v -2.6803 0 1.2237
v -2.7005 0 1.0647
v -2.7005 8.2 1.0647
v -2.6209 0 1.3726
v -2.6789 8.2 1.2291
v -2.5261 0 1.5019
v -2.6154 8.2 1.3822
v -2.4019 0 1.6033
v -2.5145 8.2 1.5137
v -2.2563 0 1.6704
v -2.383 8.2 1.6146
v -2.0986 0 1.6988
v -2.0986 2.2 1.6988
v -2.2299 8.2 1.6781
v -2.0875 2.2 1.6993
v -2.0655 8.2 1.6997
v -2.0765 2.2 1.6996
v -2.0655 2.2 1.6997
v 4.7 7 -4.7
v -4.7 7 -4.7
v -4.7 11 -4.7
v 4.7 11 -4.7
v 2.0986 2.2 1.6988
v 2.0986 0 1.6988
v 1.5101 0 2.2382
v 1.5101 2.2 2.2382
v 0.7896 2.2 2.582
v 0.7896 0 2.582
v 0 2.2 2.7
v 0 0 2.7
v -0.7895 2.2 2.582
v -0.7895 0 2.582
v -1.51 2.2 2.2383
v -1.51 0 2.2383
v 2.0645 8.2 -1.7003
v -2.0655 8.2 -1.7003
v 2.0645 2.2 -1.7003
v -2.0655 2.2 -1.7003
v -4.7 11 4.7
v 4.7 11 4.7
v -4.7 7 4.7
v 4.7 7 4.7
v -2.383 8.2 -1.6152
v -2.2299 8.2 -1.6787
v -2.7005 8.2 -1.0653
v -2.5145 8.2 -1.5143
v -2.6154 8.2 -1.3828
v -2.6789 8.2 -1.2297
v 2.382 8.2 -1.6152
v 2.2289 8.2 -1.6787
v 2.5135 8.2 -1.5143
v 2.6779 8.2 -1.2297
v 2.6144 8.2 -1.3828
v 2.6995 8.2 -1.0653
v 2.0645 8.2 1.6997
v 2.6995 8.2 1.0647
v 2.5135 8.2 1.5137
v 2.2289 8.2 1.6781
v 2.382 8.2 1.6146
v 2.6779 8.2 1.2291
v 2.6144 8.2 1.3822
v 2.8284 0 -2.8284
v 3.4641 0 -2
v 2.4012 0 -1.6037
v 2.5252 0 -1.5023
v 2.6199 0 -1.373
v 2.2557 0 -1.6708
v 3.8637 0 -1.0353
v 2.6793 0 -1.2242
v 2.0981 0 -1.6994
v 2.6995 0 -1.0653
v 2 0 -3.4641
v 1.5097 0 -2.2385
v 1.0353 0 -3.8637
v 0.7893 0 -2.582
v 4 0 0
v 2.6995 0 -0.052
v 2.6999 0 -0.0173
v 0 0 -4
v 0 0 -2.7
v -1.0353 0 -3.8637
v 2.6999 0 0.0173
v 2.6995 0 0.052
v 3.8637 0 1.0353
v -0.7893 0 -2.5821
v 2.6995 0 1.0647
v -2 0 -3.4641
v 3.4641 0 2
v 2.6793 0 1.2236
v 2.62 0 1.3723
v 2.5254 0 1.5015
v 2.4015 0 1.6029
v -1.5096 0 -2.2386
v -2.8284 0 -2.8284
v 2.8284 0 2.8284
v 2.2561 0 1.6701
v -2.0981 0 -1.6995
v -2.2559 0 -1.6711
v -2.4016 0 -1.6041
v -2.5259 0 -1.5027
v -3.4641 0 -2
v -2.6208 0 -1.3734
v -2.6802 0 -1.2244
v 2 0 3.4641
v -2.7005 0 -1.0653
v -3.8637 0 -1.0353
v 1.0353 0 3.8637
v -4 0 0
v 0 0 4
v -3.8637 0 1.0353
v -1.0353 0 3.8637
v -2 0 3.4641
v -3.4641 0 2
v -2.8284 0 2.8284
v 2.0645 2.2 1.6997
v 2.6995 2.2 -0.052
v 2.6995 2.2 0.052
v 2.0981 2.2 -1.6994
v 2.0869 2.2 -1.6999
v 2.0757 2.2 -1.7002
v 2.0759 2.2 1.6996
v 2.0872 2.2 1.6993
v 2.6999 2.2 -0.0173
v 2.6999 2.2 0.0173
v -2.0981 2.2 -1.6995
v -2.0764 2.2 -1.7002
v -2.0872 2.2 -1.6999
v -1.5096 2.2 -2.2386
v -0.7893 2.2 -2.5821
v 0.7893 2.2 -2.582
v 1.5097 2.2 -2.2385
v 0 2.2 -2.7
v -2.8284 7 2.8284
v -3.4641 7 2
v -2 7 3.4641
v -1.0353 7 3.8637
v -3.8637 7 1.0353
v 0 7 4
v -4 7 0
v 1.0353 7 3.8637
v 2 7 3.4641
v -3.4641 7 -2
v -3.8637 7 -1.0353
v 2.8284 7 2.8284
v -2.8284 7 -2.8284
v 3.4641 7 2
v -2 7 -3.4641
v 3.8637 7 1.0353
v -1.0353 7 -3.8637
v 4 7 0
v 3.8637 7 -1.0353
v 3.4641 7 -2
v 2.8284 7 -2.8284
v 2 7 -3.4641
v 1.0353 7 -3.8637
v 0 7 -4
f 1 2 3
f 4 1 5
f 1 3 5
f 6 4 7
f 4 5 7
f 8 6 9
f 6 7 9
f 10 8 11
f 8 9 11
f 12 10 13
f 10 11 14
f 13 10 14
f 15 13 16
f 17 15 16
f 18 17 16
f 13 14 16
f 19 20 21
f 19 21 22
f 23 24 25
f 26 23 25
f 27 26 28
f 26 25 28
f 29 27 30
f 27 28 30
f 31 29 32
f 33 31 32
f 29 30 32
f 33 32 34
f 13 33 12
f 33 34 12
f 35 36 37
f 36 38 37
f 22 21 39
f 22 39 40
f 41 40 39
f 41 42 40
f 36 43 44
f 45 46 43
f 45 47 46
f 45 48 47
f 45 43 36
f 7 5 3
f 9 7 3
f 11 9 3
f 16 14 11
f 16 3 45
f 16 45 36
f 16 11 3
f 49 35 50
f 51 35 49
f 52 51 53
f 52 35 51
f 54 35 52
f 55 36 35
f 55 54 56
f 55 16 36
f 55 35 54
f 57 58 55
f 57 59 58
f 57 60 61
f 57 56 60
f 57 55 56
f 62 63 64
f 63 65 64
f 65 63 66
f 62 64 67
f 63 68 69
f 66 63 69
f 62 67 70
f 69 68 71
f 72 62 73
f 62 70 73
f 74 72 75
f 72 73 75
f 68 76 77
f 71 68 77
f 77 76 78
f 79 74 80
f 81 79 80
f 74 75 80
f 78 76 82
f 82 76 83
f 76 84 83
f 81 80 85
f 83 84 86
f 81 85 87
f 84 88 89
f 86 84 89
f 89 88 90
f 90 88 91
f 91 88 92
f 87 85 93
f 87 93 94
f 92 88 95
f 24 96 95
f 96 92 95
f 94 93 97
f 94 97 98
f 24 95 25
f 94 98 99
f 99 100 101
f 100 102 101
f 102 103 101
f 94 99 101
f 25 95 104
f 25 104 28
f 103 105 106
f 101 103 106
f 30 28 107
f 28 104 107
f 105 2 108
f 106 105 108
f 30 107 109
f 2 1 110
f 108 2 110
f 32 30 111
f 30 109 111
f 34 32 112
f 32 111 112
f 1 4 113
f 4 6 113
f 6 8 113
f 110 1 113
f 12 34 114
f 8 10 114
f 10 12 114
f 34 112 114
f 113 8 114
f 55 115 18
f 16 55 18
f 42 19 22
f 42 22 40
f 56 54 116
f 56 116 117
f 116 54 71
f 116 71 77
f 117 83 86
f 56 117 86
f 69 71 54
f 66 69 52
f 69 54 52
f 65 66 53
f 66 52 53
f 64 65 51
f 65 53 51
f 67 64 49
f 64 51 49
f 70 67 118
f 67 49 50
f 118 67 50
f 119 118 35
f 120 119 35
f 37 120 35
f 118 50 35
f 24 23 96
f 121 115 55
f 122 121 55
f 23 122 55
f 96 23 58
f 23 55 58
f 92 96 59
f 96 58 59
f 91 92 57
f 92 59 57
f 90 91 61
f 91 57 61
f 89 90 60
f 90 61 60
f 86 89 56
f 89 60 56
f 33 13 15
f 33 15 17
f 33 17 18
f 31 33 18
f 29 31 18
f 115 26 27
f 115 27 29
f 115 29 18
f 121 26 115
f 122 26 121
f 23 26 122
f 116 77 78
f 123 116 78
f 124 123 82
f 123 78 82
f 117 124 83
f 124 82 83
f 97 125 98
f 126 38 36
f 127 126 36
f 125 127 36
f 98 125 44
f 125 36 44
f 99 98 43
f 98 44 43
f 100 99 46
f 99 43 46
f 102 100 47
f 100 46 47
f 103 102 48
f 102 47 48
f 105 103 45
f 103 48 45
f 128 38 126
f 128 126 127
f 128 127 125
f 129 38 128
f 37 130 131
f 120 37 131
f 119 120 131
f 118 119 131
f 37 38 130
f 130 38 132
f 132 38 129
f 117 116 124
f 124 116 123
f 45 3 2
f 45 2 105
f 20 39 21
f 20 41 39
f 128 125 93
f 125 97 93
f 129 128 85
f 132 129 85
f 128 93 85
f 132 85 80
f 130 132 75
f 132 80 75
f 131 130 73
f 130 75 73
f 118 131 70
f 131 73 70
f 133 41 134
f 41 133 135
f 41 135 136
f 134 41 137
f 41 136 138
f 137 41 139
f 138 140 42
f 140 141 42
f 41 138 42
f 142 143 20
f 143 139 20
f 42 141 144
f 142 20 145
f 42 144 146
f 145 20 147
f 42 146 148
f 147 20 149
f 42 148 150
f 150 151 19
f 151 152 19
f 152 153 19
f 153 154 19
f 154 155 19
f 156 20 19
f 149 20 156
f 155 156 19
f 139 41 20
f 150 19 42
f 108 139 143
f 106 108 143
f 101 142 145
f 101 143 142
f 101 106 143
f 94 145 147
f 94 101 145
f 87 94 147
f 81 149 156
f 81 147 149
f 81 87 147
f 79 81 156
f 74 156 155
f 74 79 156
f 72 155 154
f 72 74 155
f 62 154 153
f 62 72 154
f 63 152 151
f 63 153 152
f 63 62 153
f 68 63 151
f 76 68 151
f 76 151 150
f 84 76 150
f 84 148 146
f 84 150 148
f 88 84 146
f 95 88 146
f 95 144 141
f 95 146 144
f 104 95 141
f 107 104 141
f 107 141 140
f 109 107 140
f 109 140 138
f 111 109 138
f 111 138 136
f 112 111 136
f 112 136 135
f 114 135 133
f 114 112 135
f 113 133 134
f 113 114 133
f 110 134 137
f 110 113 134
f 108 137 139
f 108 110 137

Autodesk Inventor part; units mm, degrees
ref_plane "YZ Plane" through (0, 0, 0) normal (1, 0, 0) x (0, 1, 0)
ref_plane "XZ Plane" through (0, 0, 0) normal (0, 1, 0) x (-1, 0, 0)
ref_plane "XY Plane" through (0, 0, 0) normal (0, 0, 1) x (1, 0, 0)
sketch "Sketch1" plane through (0, 0, 0) normal (0, 1, 0) x (-1, 0, 0)
  line L0 (14.5, -14.5) -> (-14.5, -14.5)
  line L1 (-14.5, -14.5) -> (-14.5, 14.5)
  line L2 (-14.5, 14.5) -> (14.5, 14.5)
  line L3 (14.5, 14.5) -> (14.5, -14.5)
  circle A0 centre (0, 0) radius 4
  dimension "d11" = 29
  dimension "d14" = 29
  dimension "d31" = 8
extrude "Extrusion1" add sketch "Sketch1" along normal blind 7 contours A0
sketch "Sketch2" plane through (0, 7, 0) normal (0, 1, 0) x (1, 0, 0)
  line L0 (-4.7, 4.7) -> (4.7, 4.7)
  line L1 (4.7, 4.7) -> (4.7, -4.7)
  line L2 (4.7, -4.7) -> (-4.7, -4.7)
  line L3 (-4.7, -4.7) -> (-4.7, 4.7)
  line L4 (14.5, 14.5) -> (-14.5, 14.5) projected
  line L5 (14.5, -14.5) -> (14.5, 14.5) projected
  line L6 (-14.5, -14.5) -> (14.5, -14.5) projected
  line L7 (-14.5, 14.5) -> (-14.5, -14.5) projected
  point P0 (0, 0)
  dimension "d15" = 9.8
  dimension "d16" = 9.8
  dimension "d17" = 9.8
  dimension "d18" = 9.8
  dimension "d32" = 9.4
  dimension "d50" = 29
extrude "Extrusion2" add sketch "Sketch2" along normal blind 4 contours L0 L1 L2 L3
sketch "Sketch3" plane through (0, 0, 0) normal (0, -1, 0) x (1, 0, 0)
  line L0 (-0.0005, -0.0003) -> (-0.0005, -1.7003)
  line L1 (-0.0005, -1.7003) -> (2.6995, -1.7003)
  line L2 (2.6995, -1.7003) -> (2.6995, 1.6997)
  line L3 (2.6995, 1.6997) -> (-2.7005, 1.6997)
  line L4 (-2.7005, 1.6997) -> (-2.7005, -1.7003)
  line L5 (-2.7005, -1.7003) -> (-0.0005, -1.7003)
  dimension "d42" = 1.7
  dimension "d43" = 2.7
  dimension "d44" = 3.4
  dimension "d45" = 5.4
extrude "Extrusion3" cut sketch "Sketch3" against normal blind 8.2
sketch "Sketch5" plane through (0, 0, 0) normal (0, -1, 0) x (1, 0, 0)
  circle A0 centre (0, 0) radius 2.7
  dimension "d35" = 5.4
extrude "Extrusion4" cut sketch "Sketch5" against normal blind 2.2
fillet "Fillet1" radius 0.635 4 edges at (2.6995, 4.1, 1.6997) (2.6995, 4.1, -1.7003) (-2.7005, 4.1, -1.7003) (-2.7005, 4.1, 1.6997)
equation "\"d14\" = d11"
equation "\"d16\" = d15"
equation "\"d17\" = d15"
equation "\"d18\" = d15"
equation "\"d42\" = 0.5 * d44"
properties part number "Motor_Key_Bearing_2_2"
